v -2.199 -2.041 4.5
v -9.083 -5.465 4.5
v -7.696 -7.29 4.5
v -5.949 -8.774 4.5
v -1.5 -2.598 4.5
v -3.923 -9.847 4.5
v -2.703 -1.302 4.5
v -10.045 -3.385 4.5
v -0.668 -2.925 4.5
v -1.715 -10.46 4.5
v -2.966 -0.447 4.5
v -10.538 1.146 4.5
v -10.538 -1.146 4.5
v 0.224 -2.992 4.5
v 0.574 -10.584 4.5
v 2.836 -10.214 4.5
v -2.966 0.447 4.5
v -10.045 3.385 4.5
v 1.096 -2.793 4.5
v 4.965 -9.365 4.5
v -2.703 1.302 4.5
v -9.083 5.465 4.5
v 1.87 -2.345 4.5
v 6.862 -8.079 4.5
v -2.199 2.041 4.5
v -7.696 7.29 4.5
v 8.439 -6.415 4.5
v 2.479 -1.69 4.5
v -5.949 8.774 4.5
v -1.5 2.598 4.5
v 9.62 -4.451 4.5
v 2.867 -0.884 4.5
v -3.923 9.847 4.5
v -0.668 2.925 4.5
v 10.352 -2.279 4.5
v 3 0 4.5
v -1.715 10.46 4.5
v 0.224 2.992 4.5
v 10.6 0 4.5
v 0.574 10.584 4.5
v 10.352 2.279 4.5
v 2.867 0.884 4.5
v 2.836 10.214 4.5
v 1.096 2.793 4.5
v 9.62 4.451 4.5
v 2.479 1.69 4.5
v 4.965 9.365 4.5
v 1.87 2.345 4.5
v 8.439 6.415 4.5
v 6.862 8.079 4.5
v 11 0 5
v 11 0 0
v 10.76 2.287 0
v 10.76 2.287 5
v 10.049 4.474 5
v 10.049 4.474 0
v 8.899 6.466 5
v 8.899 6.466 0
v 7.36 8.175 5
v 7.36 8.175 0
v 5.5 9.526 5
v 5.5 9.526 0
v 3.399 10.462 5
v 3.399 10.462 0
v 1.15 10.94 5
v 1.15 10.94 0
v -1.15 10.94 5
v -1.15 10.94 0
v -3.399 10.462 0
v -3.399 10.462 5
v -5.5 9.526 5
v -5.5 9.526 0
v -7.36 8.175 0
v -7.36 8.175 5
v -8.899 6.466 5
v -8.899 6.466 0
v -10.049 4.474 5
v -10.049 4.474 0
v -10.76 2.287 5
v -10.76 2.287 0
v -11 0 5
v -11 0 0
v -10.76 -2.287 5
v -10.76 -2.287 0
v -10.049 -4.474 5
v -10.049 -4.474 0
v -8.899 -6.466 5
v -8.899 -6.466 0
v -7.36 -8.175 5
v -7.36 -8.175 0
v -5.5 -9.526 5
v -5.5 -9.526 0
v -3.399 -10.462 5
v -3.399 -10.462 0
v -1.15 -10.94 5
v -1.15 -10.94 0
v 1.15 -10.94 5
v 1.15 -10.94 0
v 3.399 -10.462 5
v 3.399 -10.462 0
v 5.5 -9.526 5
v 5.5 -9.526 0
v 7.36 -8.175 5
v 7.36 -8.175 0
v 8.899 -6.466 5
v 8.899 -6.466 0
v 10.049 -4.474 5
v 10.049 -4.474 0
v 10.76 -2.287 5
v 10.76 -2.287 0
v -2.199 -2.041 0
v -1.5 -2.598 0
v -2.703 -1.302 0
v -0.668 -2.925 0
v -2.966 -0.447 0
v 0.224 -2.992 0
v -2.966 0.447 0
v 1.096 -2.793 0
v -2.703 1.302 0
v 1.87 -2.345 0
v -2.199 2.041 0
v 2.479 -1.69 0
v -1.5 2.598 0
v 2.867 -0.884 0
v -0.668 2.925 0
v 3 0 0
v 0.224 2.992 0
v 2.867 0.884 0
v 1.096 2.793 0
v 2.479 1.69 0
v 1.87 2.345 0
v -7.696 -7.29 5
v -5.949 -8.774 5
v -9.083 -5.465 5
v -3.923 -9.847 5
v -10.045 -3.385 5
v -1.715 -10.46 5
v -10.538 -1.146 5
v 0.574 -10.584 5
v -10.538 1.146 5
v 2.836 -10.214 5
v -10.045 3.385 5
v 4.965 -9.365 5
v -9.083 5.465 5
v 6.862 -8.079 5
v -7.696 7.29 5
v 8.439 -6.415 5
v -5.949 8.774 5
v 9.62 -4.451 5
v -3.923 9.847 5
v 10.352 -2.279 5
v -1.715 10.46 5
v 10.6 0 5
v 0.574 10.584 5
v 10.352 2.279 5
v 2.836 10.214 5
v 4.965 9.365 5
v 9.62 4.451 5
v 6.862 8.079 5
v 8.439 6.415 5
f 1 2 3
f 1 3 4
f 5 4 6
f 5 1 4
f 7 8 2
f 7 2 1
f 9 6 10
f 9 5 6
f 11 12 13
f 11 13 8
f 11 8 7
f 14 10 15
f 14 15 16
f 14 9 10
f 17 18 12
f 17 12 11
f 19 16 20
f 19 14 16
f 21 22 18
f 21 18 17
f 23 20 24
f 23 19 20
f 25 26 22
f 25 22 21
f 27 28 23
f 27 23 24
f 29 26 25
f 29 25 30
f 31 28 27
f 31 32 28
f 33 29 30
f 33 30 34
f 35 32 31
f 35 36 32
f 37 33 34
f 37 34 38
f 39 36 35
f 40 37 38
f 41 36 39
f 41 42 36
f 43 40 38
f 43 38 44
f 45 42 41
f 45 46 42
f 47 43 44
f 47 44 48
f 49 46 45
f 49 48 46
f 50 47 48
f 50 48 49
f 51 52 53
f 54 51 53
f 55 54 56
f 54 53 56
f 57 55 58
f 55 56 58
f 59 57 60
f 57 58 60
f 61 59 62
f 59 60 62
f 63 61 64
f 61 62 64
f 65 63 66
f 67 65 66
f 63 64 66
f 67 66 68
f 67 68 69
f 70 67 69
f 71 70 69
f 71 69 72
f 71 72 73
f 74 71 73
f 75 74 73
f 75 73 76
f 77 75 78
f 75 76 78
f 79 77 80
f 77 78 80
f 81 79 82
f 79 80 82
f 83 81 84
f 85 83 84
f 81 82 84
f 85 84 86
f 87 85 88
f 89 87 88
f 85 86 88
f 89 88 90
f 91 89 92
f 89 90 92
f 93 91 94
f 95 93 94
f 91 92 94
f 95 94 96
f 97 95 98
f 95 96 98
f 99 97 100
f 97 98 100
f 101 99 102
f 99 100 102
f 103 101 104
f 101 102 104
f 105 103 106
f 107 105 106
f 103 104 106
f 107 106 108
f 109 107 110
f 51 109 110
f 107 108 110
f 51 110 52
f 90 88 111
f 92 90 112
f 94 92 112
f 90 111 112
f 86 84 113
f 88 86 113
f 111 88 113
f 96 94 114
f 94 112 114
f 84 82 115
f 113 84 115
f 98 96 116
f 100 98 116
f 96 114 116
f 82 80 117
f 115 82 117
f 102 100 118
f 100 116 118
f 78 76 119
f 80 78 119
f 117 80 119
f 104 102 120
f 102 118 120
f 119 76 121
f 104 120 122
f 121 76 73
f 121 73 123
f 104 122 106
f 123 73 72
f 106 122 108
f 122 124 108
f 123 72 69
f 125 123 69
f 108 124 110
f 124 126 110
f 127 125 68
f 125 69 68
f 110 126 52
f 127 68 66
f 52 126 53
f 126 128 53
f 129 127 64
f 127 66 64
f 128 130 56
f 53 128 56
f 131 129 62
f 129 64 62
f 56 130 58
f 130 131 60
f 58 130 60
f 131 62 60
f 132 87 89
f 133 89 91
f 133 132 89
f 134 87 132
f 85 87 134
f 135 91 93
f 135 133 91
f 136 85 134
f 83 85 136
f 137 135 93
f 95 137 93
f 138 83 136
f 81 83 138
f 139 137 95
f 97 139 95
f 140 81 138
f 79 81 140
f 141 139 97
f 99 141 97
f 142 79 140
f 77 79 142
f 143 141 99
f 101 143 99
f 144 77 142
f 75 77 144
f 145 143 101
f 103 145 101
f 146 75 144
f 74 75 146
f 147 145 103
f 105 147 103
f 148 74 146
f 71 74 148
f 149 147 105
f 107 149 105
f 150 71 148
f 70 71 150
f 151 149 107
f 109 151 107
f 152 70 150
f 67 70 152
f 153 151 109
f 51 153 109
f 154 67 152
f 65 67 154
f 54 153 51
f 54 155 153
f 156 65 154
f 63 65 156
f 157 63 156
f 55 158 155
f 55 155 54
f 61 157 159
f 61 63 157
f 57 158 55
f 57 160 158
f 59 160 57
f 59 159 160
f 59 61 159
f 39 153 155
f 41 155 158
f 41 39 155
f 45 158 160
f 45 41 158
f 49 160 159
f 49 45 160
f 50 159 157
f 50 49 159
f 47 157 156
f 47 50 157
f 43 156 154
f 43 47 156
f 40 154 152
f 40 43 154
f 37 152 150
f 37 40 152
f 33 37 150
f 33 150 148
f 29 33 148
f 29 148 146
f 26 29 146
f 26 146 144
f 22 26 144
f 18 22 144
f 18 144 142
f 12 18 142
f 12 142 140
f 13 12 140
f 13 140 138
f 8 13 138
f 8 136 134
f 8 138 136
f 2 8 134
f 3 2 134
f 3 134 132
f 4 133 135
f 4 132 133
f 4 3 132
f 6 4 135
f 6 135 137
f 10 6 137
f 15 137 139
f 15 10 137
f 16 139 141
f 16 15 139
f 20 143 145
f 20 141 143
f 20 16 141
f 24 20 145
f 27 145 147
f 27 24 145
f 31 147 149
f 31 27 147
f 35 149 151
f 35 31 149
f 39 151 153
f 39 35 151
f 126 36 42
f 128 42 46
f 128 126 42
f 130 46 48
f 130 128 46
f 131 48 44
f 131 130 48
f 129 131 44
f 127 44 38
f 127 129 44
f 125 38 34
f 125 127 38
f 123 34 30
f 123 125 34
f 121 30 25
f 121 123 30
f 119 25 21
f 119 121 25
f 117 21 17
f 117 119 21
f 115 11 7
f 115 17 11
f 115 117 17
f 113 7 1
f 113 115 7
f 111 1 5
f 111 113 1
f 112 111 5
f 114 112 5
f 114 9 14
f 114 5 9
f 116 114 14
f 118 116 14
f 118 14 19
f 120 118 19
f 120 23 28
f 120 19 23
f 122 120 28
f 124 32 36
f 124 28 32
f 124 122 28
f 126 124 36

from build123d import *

# Parameters (mm, degrees)
CYLINDER036_R     = 10.6
CYLINDER036_DEPTH = 10
CYLINDER034_R     = 3
CYLINDER034_DEPTH = 5
CYLINDER035_R     = 11
CYLINDER035_DEPTH = 5


with BuildPart() as cylinder036:
    # Cylinder036 → Cylinder036 (new body)
    with BuildSketch(Plane.XY.offset(4.5)):
        Circle(CYLINDER036_R)
    extrude(amount=CYLINDER036_DEPTH)


with BuildPart() as cylinder034:
    # Cylinder034 → Cylinder034 (new body)
    with BuildSketch(Plane.XY):
        Circle(CYLINDER034_R)
    extrude(amount=CYLINDER034_DEPTH)


with BuildPart() as cut030:
    # Cylinder035 → Cylinder035 (new body)
    with BuildSketch(Plane.XY):
        Circle(CYLINDER035_R)
    extrude(amount=CYLINDER035_DEPTH)

    # Cut029: cut Cylinder034
    add(cylinder034.part, mode=Mode.SUBTRACT)

    # Cut030: cut Cylinder036
    add(cylinder036.part, mode=Mode.SUBTRACT)


solid = cut030.part
